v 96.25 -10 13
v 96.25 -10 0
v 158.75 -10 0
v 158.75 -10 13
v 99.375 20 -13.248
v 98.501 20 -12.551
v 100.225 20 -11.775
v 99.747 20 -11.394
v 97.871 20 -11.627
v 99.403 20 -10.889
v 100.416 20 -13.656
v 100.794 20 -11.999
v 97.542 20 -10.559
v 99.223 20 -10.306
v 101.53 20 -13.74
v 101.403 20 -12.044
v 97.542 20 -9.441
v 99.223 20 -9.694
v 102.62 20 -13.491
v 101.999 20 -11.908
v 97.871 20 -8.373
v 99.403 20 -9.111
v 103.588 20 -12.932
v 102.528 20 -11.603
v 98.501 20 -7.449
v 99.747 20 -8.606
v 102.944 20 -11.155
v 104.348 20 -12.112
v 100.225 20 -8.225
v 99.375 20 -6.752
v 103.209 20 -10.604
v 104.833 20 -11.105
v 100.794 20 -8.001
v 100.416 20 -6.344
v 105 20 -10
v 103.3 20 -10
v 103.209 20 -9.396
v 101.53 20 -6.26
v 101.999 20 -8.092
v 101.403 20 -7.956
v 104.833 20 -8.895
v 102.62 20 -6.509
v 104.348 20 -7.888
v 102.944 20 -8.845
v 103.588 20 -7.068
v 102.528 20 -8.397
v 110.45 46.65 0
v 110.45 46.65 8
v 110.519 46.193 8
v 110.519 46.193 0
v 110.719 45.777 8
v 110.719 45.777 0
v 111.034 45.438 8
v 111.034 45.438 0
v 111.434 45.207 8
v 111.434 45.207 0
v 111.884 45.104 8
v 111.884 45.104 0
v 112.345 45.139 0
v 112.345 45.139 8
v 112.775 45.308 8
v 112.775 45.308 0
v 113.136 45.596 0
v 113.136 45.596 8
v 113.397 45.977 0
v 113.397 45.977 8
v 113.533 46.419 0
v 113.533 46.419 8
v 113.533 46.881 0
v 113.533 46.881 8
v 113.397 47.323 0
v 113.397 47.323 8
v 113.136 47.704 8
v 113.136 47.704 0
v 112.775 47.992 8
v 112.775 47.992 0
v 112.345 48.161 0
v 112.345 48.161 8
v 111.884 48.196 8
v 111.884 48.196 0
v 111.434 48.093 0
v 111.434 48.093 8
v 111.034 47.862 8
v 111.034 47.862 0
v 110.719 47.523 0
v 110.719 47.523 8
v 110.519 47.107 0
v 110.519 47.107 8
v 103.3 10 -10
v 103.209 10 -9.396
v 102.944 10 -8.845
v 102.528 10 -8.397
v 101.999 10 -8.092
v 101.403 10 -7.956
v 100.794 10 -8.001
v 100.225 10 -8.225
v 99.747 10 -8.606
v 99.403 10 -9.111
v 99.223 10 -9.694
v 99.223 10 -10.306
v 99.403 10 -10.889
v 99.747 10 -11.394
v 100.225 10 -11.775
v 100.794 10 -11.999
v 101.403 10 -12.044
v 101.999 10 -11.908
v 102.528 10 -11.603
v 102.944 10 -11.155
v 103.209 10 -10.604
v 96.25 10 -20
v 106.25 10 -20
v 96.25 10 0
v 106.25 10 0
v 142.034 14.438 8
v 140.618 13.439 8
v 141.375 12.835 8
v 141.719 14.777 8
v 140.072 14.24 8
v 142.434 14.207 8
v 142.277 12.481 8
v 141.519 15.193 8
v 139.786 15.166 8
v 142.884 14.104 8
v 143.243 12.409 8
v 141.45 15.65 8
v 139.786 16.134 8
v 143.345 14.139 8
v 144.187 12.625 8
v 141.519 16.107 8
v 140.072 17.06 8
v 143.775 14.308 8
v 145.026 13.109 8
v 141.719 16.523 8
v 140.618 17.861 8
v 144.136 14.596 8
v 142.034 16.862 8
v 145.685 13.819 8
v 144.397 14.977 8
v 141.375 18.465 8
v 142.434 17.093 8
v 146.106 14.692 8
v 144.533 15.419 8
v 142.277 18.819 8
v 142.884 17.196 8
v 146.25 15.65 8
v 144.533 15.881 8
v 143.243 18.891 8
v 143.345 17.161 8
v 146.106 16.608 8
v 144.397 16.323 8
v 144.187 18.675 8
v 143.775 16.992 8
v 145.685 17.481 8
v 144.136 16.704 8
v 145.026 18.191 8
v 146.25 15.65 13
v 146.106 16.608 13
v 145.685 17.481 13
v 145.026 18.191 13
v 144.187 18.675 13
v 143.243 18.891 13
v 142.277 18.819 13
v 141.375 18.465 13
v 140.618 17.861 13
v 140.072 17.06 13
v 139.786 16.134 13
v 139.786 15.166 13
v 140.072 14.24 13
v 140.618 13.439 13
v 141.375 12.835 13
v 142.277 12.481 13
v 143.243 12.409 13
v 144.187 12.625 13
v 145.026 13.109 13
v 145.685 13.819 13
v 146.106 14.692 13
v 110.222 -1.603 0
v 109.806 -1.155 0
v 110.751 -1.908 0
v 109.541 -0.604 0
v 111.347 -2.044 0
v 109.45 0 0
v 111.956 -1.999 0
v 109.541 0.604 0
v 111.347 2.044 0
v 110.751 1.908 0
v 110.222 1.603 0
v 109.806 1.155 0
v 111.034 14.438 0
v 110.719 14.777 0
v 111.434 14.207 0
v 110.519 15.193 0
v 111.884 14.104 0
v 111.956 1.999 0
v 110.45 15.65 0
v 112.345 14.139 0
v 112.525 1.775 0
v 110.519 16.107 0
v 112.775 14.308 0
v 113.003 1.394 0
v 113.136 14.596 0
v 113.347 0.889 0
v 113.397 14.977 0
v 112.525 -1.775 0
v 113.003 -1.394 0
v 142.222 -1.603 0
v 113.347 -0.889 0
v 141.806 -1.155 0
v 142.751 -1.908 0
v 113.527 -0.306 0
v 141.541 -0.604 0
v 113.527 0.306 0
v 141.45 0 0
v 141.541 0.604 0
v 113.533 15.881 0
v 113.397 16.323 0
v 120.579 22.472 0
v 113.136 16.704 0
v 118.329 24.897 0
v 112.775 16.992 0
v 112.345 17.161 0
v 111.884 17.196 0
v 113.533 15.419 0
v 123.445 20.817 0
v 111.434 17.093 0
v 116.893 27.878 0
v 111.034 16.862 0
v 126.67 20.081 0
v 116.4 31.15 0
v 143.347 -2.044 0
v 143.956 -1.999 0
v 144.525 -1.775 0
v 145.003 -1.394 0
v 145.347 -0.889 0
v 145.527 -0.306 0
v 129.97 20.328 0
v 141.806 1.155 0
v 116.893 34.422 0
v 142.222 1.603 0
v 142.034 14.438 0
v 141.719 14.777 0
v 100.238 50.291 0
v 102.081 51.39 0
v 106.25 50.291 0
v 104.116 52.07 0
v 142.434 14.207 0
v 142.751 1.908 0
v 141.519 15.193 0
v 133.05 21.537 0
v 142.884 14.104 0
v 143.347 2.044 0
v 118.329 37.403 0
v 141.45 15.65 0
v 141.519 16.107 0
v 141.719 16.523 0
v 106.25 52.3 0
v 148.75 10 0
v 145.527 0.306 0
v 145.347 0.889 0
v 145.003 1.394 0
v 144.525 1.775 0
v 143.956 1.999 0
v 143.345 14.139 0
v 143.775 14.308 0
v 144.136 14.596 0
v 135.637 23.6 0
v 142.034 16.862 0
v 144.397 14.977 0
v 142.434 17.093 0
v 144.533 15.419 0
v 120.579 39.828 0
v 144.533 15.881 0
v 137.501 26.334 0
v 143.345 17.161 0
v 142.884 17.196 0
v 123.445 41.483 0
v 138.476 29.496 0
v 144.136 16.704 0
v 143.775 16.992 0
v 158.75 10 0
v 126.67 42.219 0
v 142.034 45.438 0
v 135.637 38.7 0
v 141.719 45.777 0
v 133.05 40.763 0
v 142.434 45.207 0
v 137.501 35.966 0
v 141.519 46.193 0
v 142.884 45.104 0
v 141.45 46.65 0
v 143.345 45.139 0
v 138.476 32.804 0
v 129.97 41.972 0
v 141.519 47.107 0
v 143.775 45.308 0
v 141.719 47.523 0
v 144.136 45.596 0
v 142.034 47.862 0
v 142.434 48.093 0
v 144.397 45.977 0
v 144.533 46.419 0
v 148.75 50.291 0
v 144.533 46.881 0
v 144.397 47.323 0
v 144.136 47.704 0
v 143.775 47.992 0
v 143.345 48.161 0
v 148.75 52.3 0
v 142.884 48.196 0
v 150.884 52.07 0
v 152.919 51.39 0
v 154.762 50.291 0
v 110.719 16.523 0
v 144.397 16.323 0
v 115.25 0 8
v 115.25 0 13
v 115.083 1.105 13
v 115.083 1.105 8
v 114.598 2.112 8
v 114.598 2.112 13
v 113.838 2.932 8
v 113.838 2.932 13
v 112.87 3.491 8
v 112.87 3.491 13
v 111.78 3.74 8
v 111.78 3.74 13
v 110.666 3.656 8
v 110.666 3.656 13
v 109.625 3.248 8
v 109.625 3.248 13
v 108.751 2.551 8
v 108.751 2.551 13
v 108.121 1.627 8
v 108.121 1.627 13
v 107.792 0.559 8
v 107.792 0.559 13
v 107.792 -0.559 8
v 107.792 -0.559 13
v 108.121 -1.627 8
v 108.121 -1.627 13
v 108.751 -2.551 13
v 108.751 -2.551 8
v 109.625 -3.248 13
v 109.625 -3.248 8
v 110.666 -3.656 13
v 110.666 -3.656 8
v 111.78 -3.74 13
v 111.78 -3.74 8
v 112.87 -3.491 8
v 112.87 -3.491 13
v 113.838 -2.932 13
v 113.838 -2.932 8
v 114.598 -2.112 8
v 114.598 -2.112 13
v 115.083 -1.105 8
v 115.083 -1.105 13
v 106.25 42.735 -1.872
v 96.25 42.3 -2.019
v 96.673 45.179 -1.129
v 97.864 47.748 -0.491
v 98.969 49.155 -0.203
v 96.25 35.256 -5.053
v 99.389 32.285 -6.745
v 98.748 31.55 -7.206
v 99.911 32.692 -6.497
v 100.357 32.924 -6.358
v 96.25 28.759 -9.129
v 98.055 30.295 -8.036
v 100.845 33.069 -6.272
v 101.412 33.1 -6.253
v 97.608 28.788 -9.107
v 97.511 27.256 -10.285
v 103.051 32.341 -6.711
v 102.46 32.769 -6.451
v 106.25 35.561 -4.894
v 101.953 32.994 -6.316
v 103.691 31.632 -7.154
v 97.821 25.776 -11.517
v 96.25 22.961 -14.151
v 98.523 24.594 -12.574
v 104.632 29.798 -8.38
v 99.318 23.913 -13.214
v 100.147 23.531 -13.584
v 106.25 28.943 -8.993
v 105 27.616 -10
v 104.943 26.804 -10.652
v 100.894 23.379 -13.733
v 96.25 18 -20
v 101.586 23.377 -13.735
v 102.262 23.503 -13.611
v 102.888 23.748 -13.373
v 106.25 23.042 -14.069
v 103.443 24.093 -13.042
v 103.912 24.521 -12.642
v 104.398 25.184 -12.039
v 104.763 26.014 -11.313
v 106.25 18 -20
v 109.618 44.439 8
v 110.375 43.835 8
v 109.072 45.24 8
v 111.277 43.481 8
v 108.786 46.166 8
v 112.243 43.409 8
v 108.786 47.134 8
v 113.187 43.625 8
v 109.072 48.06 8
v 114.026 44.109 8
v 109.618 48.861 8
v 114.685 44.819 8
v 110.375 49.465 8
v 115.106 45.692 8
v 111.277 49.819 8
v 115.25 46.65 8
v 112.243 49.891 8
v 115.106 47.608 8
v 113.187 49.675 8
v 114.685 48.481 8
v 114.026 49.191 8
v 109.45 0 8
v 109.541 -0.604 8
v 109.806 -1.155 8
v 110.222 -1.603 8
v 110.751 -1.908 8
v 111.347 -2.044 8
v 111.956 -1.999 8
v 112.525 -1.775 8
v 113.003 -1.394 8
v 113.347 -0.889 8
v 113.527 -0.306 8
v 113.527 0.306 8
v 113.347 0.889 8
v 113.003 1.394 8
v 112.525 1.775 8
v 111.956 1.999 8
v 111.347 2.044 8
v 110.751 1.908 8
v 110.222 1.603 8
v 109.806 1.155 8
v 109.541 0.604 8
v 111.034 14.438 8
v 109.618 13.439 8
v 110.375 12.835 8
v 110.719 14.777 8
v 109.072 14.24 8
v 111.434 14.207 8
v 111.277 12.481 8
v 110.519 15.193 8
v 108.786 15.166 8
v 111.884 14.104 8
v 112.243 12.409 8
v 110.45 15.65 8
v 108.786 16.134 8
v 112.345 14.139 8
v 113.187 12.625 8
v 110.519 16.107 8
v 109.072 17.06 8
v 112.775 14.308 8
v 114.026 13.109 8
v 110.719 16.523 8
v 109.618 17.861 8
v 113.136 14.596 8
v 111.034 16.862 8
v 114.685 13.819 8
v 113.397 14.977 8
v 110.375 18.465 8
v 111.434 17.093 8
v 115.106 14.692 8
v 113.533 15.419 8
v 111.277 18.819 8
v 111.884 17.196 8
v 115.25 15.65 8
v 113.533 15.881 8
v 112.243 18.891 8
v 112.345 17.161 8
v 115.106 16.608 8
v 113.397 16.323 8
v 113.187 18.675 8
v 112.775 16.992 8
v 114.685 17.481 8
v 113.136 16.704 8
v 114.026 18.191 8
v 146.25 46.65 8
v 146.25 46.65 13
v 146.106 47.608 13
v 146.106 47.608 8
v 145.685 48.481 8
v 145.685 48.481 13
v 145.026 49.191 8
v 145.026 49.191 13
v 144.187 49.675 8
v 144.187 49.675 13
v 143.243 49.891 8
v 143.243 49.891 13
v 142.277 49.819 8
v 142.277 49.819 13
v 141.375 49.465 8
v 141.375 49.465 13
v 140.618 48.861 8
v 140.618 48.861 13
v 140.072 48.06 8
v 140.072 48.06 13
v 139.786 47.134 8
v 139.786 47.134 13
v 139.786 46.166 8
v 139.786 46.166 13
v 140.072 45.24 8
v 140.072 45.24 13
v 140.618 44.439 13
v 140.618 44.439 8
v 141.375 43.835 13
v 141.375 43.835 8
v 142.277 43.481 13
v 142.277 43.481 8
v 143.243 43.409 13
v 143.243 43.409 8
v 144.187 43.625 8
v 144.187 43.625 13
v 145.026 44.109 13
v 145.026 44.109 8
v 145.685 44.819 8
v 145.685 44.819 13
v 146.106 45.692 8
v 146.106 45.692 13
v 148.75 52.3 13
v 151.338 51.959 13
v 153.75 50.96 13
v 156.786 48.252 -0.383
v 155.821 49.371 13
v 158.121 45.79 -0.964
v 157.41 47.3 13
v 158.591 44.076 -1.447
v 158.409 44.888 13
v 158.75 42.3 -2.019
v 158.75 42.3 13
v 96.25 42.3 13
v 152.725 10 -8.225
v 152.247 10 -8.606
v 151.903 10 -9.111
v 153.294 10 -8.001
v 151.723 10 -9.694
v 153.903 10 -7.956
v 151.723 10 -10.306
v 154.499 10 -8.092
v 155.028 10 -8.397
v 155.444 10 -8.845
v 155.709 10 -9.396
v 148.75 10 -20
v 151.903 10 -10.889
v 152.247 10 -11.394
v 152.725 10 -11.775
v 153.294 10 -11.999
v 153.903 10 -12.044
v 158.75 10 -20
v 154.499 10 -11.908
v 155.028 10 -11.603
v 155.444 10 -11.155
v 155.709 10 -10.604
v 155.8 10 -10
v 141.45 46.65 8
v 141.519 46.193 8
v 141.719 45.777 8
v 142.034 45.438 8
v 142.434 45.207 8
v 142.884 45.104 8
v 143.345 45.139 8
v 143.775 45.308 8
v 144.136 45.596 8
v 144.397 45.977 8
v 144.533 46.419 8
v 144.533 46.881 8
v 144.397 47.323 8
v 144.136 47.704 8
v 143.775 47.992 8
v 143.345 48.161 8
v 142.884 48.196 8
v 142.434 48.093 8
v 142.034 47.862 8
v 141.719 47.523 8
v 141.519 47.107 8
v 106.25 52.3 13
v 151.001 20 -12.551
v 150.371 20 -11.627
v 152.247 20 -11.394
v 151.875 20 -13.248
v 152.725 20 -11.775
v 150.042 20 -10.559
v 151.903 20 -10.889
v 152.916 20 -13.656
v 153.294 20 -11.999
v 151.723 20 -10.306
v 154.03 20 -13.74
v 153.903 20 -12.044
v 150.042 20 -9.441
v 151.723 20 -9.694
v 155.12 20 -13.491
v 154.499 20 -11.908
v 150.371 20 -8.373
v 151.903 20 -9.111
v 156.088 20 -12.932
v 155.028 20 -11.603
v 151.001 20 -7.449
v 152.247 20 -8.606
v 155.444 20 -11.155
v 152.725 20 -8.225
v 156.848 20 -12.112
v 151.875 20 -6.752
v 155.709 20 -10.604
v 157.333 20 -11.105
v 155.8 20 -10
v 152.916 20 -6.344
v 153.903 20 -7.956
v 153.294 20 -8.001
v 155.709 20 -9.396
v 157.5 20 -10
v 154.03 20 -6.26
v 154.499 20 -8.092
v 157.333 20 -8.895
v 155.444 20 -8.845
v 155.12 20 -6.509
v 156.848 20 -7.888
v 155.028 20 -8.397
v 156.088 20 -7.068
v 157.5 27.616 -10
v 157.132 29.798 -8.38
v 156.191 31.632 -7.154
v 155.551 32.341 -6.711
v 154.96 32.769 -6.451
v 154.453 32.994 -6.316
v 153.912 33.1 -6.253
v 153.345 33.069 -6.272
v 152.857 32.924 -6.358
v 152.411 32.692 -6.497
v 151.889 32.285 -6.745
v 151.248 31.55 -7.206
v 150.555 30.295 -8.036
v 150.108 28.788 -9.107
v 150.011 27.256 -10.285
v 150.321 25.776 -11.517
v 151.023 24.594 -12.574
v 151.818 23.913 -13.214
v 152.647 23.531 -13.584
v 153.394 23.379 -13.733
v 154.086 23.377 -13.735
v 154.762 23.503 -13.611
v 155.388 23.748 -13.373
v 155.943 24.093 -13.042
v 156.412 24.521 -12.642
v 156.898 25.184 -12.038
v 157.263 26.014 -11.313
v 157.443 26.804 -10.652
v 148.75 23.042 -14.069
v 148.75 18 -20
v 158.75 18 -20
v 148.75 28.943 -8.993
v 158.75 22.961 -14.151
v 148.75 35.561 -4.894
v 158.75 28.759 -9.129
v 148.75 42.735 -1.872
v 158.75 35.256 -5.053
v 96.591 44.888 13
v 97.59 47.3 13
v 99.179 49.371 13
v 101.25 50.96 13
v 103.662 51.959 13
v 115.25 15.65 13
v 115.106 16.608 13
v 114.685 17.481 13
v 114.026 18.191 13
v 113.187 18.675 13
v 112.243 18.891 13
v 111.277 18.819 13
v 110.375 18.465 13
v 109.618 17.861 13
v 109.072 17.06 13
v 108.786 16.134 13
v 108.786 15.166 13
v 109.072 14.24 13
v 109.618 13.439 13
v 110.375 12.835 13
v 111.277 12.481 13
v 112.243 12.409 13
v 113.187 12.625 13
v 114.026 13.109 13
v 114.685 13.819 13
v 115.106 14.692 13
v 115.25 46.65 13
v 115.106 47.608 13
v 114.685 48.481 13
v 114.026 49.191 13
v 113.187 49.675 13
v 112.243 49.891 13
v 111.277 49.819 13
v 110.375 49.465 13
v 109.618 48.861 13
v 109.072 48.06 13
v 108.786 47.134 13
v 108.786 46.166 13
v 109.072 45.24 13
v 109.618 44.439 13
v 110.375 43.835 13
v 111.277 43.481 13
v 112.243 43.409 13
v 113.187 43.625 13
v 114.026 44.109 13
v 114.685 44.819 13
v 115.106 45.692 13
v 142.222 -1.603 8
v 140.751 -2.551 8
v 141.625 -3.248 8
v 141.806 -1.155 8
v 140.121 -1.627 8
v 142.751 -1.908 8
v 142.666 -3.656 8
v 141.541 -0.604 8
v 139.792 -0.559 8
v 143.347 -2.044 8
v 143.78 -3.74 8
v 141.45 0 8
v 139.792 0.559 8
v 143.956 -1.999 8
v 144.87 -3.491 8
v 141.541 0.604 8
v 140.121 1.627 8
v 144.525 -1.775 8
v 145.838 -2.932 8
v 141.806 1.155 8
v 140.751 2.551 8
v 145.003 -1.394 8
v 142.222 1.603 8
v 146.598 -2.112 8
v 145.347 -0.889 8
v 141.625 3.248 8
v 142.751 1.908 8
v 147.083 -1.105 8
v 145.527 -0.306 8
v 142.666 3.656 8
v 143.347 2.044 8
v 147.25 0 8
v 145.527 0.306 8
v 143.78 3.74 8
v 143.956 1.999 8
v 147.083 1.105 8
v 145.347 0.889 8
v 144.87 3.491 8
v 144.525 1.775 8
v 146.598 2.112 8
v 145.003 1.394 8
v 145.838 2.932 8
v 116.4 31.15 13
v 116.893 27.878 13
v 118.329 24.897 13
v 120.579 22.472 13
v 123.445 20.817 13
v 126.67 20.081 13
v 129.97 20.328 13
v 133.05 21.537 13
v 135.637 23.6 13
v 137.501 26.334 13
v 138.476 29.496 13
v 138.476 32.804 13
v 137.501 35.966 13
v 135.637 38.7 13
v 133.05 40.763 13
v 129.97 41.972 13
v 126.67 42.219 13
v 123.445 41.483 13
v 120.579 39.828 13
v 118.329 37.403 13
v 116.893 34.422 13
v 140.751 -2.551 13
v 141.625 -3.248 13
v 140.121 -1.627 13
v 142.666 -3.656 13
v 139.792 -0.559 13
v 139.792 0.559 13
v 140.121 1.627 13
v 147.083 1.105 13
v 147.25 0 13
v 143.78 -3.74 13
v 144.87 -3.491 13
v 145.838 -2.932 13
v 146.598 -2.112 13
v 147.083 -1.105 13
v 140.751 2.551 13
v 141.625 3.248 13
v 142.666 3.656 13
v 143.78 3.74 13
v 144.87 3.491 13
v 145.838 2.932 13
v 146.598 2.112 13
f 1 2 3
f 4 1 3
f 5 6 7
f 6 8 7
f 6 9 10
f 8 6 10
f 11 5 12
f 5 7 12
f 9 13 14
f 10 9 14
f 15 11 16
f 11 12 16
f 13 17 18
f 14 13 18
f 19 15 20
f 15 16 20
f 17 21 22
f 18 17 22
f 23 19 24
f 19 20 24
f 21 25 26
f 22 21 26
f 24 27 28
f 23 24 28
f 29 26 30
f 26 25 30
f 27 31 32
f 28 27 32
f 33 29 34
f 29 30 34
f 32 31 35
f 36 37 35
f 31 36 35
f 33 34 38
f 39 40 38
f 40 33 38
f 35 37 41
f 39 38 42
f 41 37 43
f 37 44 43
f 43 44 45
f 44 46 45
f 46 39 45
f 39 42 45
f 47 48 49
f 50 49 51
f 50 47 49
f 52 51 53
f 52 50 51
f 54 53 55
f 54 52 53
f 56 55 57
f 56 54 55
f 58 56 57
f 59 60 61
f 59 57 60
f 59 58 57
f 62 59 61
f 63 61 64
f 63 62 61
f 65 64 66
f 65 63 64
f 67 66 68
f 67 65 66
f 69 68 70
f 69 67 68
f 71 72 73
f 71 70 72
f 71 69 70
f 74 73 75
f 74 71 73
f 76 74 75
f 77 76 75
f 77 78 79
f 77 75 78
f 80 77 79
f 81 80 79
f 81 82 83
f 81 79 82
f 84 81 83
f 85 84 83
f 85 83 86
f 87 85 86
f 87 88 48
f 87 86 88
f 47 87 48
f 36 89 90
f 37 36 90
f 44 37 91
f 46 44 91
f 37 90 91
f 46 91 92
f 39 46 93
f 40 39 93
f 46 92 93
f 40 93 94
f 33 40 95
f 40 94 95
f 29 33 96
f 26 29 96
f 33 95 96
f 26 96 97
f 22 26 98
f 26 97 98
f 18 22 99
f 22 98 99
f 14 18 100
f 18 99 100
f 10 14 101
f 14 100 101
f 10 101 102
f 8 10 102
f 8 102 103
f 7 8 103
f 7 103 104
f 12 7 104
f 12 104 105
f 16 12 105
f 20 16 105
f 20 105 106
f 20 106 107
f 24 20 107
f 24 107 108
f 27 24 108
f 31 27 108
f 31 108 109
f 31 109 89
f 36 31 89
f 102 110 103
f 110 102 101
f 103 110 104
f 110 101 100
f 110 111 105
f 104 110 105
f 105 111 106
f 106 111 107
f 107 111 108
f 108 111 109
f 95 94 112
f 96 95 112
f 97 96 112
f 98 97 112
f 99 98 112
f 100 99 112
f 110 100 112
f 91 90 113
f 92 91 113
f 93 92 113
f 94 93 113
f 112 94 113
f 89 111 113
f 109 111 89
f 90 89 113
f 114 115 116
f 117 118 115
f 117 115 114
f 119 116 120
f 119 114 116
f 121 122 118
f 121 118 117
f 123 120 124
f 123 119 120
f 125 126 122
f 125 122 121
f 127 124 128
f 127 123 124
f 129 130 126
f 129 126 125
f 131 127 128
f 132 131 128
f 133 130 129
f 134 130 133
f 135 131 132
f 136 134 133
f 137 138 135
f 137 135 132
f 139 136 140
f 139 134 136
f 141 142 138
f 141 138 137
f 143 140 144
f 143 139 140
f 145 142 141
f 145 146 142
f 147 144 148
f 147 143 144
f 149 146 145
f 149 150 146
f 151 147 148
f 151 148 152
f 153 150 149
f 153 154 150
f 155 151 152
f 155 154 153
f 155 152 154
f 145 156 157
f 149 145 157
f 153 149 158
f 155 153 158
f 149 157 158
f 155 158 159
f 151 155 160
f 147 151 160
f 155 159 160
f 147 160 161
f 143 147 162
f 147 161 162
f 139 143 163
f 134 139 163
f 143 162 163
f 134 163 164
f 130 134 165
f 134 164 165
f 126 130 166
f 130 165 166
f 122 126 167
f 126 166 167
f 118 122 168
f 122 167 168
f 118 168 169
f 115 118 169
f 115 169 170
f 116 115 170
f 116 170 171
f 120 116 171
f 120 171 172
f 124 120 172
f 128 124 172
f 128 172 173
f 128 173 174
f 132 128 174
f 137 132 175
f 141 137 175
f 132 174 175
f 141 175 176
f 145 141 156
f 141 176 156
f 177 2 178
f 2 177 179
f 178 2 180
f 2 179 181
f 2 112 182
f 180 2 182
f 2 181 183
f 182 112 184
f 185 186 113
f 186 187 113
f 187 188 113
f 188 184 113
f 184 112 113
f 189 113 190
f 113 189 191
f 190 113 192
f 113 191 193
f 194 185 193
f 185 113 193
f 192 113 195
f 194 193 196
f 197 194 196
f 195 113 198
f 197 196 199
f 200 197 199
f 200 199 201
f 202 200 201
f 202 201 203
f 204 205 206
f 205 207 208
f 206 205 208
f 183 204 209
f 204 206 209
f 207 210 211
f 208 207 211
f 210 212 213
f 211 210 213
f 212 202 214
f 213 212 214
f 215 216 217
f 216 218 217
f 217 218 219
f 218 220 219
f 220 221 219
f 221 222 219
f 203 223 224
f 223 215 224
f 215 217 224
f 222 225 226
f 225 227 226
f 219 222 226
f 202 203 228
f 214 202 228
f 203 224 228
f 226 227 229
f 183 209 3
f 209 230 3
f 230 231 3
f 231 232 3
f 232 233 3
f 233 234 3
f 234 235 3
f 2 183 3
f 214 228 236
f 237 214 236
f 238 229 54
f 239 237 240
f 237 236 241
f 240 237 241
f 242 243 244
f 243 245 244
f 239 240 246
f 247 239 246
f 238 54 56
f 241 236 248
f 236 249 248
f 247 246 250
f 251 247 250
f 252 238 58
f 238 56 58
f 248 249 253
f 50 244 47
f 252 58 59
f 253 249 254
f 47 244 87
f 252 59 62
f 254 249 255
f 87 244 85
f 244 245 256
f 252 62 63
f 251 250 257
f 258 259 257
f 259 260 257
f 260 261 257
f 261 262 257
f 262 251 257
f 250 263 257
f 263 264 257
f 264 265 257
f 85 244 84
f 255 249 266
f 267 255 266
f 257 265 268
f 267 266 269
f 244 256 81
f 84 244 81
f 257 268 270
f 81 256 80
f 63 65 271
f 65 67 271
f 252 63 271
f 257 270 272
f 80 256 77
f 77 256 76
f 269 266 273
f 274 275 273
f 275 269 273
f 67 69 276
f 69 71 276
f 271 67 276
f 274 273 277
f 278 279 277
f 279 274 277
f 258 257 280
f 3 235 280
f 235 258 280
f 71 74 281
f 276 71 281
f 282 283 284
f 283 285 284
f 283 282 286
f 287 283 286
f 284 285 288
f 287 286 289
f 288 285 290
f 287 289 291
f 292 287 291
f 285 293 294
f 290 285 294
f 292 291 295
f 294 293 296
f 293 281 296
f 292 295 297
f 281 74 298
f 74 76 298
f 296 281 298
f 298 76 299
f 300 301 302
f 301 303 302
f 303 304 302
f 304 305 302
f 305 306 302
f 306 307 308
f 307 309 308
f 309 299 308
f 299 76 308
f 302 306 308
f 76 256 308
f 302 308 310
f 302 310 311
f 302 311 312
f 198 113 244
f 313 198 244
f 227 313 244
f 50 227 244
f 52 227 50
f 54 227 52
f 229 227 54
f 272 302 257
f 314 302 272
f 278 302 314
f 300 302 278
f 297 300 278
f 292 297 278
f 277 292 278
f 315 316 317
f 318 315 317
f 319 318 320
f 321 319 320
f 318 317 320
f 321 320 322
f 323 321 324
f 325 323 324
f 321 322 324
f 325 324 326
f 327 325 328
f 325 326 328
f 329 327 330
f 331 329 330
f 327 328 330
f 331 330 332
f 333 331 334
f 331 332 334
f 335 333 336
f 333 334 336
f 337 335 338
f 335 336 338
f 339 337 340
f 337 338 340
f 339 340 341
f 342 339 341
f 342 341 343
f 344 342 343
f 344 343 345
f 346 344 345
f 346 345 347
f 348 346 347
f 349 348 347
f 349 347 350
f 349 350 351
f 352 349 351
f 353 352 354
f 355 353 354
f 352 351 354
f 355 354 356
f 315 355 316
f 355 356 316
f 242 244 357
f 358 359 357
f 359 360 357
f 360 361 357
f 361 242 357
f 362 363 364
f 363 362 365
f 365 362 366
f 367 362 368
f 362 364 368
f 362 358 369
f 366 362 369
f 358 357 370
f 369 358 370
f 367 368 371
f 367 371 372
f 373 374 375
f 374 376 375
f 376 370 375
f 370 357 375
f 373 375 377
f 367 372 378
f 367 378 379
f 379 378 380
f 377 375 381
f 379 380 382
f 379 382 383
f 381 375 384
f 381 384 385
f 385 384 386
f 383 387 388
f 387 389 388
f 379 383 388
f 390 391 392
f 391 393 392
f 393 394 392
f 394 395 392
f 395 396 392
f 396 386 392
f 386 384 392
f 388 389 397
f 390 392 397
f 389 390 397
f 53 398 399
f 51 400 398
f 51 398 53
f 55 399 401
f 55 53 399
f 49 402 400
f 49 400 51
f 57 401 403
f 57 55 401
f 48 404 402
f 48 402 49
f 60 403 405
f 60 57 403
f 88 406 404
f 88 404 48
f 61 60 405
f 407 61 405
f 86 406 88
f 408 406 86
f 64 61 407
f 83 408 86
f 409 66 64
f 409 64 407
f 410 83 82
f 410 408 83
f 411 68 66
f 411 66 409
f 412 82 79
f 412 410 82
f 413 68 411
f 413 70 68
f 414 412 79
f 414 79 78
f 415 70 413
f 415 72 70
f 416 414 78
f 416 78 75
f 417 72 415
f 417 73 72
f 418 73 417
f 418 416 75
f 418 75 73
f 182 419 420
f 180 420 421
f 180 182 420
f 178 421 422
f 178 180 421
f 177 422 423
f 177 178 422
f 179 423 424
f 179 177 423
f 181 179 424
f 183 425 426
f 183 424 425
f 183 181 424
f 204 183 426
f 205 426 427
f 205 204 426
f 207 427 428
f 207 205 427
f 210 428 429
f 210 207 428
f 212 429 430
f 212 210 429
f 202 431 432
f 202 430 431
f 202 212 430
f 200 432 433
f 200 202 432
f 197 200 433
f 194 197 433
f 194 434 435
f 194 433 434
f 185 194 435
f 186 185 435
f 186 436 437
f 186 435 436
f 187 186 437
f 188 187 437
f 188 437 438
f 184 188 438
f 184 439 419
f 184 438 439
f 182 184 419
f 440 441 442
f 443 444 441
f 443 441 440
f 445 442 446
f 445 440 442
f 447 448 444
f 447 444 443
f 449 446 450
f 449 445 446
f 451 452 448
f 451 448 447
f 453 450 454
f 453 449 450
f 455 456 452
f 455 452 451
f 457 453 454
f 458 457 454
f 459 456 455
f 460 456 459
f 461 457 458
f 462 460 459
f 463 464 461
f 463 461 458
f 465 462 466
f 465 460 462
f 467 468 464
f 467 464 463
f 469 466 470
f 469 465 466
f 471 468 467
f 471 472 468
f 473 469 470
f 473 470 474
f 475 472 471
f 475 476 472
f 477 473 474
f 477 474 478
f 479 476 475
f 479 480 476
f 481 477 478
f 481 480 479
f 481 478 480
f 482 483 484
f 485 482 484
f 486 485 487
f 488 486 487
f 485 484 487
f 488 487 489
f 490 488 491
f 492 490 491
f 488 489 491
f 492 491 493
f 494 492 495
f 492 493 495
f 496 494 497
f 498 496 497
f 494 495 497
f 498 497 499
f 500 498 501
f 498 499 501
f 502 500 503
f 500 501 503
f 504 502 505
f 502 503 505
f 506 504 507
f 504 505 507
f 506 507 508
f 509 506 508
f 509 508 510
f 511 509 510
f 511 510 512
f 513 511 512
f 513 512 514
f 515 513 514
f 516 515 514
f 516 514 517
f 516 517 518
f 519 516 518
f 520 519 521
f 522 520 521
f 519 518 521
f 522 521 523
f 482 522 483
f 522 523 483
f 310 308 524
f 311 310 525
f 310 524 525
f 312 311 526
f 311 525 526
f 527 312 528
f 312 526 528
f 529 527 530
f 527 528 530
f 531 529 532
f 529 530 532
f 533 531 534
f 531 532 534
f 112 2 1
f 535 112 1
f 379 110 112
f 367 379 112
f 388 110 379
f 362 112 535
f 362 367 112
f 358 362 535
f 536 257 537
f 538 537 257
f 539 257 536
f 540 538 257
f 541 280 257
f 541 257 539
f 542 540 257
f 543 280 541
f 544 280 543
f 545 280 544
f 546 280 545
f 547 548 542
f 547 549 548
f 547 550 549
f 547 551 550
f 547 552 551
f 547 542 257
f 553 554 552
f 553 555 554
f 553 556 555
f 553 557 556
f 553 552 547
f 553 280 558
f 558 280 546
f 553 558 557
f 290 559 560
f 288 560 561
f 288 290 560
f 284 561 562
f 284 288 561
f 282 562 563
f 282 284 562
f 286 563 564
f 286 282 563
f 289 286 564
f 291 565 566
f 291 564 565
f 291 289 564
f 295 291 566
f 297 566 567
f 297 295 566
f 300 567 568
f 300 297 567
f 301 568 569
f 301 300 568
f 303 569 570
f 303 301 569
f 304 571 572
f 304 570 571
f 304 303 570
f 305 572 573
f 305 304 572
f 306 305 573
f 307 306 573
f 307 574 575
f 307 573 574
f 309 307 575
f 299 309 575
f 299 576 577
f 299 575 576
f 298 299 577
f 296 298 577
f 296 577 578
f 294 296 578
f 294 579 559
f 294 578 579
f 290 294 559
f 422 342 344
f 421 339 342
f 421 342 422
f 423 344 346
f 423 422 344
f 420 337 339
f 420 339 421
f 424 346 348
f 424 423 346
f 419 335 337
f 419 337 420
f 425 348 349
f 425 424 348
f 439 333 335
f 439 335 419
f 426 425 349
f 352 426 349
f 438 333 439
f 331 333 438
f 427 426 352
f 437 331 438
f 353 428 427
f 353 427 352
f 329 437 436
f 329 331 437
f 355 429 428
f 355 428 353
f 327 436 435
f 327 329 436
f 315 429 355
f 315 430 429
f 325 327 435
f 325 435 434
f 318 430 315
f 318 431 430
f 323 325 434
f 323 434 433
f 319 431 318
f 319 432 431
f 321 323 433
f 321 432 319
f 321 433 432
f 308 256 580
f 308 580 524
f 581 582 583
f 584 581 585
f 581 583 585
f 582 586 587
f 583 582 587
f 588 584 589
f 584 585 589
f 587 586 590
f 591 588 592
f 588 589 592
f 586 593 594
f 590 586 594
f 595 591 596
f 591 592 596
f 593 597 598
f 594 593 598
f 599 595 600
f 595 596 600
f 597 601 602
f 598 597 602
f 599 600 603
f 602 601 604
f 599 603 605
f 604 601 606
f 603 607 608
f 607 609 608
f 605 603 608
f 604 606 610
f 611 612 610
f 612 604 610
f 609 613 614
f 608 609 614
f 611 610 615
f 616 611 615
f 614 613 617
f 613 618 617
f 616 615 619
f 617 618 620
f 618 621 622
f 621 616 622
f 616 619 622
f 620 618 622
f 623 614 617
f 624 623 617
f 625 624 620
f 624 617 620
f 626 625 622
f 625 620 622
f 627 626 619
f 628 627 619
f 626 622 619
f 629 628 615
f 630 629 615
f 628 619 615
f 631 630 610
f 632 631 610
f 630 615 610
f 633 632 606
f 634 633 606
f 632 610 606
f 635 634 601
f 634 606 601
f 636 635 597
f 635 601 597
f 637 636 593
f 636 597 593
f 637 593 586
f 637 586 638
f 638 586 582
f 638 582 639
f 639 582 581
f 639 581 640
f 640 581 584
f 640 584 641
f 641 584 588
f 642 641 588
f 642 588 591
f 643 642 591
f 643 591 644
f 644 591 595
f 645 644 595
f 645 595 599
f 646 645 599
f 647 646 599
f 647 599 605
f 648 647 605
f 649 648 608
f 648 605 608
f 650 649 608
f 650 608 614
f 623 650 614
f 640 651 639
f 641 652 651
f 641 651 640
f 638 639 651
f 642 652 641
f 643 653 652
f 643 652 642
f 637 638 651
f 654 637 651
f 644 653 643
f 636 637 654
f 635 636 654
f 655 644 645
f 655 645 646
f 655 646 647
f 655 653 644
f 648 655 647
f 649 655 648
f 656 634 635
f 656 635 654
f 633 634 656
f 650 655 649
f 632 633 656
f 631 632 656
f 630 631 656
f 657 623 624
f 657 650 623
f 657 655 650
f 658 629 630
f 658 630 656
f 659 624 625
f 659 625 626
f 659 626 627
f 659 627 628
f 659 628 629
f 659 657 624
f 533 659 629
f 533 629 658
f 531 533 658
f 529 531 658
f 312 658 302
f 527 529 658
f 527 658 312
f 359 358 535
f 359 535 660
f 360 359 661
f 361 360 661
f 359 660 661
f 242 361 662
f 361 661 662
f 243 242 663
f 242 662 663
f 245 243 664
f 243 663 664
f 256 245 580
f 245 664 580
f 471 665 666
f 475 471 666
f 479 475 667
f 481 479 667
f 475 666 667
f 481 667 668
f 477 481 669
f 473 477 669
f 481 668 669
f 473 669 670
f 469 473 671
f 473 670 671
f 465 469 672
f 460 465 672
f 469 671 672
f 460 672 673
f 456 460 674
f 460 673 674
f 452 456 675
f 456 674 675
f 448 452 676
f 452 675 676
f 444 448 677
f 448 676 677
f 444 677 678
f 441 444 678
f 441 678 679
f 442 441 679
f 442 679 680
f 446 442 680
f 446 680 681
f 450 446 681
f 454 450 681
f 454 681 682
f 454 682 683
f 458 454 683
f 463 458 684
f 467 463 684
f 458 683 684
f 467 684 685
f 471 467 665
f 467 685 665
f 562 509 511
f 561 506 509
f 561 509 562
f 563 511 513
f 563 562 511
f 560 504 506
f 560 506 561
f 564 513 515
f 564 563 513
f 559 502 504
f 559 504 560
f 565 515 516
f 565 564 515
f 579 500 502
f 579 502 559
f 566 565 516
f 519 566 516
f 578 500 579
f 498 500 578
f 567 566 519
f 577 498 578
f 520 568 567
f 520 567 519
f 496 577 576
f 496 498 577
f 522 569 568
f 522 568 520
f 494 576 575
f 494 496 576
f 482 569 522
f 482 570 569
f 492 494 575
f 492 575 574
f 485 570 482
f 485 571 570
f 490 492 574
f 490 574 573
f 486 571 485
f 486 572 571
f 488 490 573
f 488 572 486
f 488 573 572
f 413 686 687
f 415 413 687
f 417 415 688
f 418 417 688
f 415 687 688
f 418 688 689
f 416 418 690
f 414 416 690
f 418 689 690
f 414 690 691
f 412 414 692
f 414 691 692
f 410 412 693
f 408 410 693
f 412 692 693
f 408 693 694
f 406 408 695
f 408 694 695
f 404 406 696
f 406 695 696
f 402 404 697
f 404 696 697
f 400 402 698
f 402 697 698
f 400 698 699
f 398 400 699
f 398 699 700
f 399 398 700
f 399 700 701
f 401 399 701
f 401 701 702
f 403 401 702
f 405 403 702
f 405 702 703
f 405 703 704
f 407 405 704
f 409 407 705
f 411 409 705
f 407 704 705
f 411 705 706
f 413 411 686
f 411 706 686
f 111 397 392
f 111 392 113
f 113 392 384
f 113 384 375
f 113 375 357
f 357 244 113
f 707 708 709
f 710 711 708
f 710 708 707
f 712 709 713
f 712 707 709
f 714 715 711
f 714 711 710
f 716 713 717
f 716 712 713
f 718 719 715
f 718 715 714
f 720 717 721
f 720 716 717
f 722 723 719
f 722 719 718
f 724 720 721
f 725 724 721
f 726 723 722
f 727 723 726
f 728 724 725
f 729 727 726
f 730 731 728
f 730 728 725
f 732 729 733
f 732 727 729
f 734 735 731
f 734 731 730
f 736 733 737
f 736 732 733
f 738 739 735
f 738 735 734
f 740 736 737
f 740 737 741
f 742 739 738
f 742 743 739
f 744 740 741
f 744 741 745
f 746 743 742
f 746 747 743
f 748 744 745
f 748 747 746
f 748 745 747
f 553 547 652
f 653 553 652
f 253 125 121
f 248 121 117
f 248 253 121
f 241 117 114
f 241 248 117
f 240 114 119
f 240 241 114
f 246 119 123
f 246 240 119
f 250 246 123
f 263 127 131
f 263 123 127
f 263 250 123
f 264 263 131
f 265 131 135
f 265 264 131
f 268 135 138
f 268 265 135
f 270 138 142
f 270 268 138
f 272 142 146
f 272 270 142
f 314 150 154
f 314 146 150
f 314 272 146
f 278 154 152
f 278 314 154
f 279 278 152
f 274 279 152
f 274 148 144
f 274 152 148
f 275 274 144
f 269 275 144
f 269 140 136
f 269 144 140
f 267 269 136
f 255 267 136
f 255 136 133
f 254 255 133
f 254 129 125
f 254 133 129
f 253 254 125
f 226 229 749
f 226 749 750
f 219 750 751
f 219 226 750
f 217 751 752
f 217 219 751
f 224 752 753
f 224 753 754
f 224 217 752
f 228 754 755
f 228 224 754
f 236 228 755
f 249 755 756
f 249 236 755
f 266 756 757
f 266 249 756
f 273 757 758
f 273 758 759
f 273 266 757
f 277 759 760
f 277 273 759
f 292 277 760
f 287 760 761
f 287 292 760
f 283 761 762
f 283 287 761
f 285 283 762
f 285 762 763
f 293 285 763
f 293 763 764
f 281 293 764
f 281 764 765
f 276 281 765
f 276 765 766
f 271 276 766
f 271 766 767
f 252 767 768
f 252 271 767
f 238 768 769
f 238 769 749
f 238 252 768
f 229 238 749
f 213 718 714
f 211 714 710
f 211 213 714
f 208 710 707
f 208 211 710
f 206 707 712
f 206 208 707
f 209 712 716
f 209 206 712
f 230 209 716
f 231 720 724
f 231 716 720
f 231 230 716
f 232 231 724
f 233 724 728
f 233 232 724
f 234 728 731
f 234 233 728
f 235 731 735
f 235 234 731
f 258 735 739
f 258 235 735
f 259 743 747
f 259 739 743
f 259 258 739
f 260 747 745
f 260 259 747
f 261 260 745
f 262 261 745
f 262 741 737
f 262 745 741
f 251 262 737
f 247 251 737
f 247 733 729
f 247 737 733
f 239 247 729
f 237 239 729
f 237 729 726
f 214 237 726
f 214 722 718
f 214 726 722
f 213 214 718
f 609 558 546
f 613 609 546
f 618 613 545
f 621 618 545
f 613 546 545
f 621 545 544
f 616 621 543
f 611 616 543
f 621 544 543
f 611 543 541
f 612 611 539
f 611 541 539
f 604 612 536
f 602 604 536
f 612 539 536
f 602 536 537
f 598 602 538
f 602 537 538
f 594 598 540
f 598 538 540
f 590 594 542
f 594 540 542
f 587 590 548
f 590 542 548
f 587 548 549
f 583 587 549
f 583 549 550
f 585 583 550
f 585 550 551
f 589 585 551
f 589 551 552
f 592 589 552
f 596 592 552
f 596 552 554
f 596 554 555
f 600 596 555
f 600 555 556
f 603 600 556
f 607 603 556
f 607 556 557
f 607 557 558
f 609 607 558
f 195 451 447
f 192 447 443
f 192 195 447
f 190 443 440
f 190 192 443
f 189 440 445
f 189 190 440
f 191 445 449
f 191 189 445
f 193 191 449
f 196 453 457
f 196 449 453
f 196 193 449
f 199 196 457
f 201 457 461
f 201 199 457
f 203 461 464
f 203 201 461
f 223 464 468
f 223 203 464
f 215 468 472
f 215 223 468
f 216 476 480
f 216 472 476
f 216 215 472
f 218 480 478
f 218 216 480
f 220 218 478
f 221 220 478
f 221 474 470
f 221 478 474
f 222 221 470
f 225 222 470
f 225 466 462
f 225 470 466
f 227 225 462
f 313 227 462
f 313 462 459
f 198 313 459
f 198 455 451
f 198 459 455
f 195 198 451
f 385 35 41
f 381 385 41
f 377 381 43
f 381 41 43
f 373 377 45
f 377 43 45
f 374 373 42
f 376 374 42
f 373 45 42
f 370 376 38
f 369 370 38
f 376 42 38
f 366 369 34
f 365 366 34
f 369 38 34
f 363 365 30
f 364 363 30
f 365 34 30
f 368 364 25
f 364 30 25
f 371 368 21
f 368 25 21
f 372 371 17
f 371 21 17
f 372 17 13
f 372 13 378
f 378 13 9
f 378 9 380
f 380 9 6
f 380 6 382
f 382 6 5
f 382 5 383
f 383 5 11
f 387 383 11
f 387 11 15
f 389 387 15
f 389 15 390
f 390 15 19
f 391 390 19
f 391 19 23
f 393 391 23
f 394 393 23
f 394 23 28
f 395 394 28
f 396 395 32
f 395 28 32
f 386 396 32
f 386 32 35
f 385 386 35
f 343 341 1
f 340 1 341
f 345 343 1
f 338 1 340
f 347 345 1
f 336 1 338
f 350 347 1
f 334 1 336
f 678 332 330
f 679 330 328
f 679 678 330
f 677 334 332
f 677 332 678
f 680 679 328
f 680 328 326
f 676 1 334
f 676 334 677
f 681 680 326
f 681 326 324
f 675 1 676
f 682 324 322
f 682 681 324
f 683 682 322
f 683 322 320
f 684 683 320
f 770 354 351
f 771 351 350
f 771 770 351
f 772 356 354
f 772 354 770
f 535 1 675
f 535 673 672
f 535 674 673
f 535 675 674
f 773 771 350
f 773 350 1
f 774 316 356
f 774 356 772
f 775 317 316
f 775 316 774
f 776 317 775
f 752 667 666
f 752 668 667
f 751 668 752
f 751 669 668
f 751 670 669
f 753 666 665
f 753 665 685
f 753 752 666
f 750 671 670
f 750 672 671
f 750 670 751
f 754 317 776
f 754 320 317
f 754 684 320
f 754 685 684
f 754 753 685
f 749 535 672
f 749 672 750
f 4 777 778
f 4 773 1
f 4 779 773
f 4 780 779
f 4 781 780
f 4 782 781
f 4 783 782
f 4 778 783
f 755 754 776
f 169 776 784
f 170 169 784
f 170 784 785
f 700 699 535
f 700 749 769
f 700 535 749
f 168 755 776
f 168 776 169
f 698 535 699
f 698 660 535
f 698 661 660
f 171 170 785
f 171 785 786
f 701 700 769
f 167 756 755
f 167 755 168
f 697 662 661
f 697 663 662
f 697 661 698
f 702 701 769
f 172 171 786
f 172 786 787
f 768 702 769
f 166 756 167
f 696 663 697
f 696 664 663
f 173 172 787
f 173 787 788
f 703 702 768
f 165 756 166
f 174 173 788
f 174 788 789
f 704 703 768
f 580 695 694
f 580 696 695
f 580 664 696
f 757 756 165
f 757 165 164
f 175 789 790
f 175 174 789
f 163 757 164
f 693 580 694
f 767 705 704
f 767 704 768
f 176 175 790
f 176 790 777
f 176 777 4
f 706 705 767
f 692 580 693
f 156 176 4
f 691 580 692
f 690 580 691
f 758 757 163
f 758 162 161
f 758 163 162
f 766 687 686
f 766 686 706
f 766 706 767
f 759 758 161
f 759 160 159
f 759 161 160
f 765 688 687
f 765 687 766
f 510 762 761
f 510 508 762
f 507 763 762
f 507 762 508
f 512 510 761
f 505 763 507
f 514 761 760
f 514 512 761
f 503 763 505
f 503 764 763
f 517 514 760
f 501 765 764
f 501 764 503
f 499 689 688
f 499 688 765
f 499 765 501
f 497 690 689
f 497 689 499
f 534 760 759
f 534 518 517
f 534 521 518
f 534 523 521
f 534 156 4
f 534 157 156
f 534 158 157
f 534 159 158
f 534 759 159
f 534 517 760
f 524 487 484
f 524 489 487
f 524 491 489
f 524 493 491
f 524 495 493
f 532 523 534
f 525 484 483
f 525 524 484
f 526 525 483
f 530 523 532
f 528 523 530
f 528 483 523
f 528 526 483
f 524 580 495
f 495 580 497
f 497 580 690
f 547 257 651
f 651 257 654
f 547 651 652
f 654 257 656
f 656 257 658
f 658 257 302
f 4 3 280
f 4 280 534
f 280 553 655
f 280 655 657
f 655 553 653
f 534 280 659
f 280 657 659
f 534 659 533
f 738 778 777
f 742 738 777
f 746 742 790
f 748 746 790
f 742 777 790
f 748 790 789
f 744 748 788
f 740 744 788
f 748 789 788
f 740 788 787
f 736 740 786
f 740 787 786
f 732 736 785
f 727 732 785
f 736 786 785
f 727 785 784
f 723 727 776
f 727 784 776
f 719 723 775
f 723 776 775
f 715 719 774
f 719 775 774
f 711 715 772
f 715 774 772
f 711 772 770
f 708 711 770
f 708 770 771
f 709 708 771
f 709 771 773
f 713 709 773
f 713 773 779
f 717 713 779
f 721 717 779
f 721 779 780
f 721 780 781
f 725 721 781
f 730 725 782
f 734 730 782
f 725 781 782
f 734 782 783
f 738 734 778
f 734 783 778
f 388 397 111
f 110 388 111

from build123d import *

# Parameters (mm, degrees)
CROQUIS1_W                 = 62.5
CROQUIS1_H                 = 62.3
CROQUIS1_R                 = 11.1
CROQUIS1_R_2               = 1.55
CROQUIS1_R_3               = 2.05
SALIENTE_EXTRUIR1_DEPTH    = 13
CROQUIS2_R                 = 3.25
CROQUIS2_R_2               = 3.75
CORTAR_EXTRUIR1_DEPTH      = 5
SALIENTE_EXTRUIR2_DEPTH    = 10
SALIENTE_EXTRUIR3_START    = -10
SALIENTE_EXTRUIR3_DEPTH    = 10
CORTAR_EXTRUIR2_REACH      = 167.502
CORTAR_EXTRUIR2_END_RADIUS = 50
CROQUIS6_R                 = 2.05
CORTAR_EXTRUIR3_REACH      = 177.502
CORTAR_EXTRUIR3_END_RADIUS = 50
CORTAR_EXTRUIR3_START      = -10
CROQUIS7_R                 = 3.75
REDONDEO1_R                = 10


with BuildPart() as part:
    # Croquis1 → Saliente-Extruir1 (new body)
    with BuildSketch(Plane.XY):
        with Locations((127.5, 21.15)):
            Rectangle(CROQUIS1_W, CROQUIS1_H)
        with Locations(Location((127.5, 31.15, 0), (0, 0, 180))):
            Circle(CROQUIS1_R, mode=Mode.SUBTRACT)
        with Locations(Location((112, 46.65, 0), (0, 0, 180))):
            Circle(CROQUIS1_R_2, mode=Mode.SUBTRACT)
        with Locations(Location((143, 46.65, 0), (0, 0, 180))):
            Circle(CROQUIS1_R_2, mode=Mode.SUBTRACT)
        with Locations(Location((143, 15.65, 0), (0, 0, 180))):
            Circle(CROQUIS1_R_2, mode=Mode.SUBTRACT)
        with Locations(Location((112, 15.65, 0), (0, 0, 180))):
            Circle(CROQUIS1_R_2, mode=Mode.SUBTRACT)
        with Locations(Location((111.5, 0, 0), (0, 0, 180))):
            Circle(CROQUIS1_R_3, mode=Mode.SUBTRACT)
        with Locations(Location((143.5, 0, 0), (0, 0, 180))):
            Circle(CROQUIS1_R_3, mode=Mode.SUBTRACT)
    extrude(amount=SALIENTE_EXTRUIR1_DEPTH)

    # Croquis2 → Cortar-Extruir1 (cut)
    with BuildSketch(Plane.XY.offset(13)):
        with Locations((112, 46.65)):
            Circle(CROQUIS2_R)
        with Locations((143, 46.65)):
            Circle(CROQUIS2_R)
        with Locations((143, 15.65)):
            Circle(CROQUIS2_R)
        with Locations((112, 15.65)):
            Circle(CROQUIS2_R)
        with Locations((111.5, 0)):
            Circle(CROQUIS2_R_2)
        with Locations((143.5, 0)):
            Circle(CROQUIS2_R_2)
    extrude(amount=-CORTAR_EXTRUIR1_DEPTH, mode=Mode.SUBTRACT)

    # Croquis4 → Saliente-Extruir2 (add)
    with BuildSketch(Plane(origin=(158.75, 0, 0), x_dir=(0, 0, -1), z_dir=(1, 0, 0))):
        with BuildLine():
            Line((0, 10), (20, 10))
            Line((20, 10), (20, 18))
            ThreePointArc((20, 18), (6.81438238, 32.17234388), (0, 50.290843704))
            Line((0, 50.290843704), (0, 10))
        make_face()
    extrude(amount=-SALIENTE_EXTRUIR2_DEPTH)

    # Croquis5 → Saliente-Extruir3 (add)
    with BuildSketch(Plane.ZY.offset(-96.25).offset(SALIENTE_EXTRUIR3_START)):
        with BuildLine():
            Line((0, 10), (0, 50.290843704))
            ThreePointArc((0, 50.290843704), (-6.81438238, 32.17234388), (-20, 18))
            Line((-20, 18), (-20, 10))
            Line((-20, 10), (0, 10))
        make_face()
    extrude(amount=SALIENTE_EXTRUIR3_DEPTH)

    # Cortar-Extruir2: up to this cylinder (the profile starts outside it)
    cortar_extruir2_end = Plane(origin=(127.5, 58.5, -49.321493823), z_dir=(1, 0, 0)) * Cylinder(CORTAR_EXTRUIR2_END_RADIUS, 488.504, mode=Mode.PRIVATE)
    # Croquis6 → Cortar-Extruir2 (cut, up to the surface)
    with BuildSketch(Plane.XZ.offset(-10), mode=Mode.PRIVATE) as cortar_extruir2_sk1:
        with Locations((101.25, -10)):
            Circle(CROQUIS6_R)
    cortar_extruir2_tool1 = extrude(cortar_extruir2_sk1.sketch, amount=-CORTAR_EXTRUIR2_REACH, mode=Mode.PRIVATE) - cortar_extruir2_end
    add(cortar_extruir2_tool1.solids().sort_by_distance((101.25, 10, -10))[0], mode=Mode.SUBTRACT)
    # Croquis6 → Cortar-Extruir2 (cut, up to the surface)
    with BuildSketch(Plane.XZ.offset(-10), mode=Mode.PRIVATE) as cortar_extruir2_sk2:
        with Locations((153.75, -10)):
            Circle(CROQUIS6_R)
    cortar_extruir2_tool2 = extrude(cortar_extruir2_sk2.sketch, amount=-CORTAR_EXTRUIR2_REACH, mode=Mode.PRIVATE) - cortar_extruir2_end
    add(cortar_extruir2_tool2.solids().sort_by_distance((153.75, 10, -10))[0], mode=Mode.SUBTRACT)

    # Cortar-Extruir3: up to this cylinder (the profile starts outside it)
    cortar_extruir3_end = Plane(origin=(127.5, 58.5, -49.321493823), z_dir=(1, 0, 0)) * Cylinder(CORTAR_EXTRUIR3_END_RADIUS, 508.504, mode=Mode.PRIVATE)
    # Croquis7 → Cortar-Extruir3 (cut, up to the surface)
    with BuildSketch(Plane.XZ.offset(-10).offset(CORTAR_EXTRUIR3_START), mode=Mode.PRIVATE) as cortar_extruir3_sk1:
        with Locations((101.25, -10)):
            Circle(CROQUIS7_R)
    cortar_extruir3_tool1 = extrude(cortar_extruir3_sk1.sketch, amount=-CORTAR_EXTRUIR3_REACH, mode=Mode.PRIVATE) - cortar_extruir3_end
    add(cortar_extruir3_tool1.solids().sort_by_distance((101.25, 20, -10))[0], mode=Mode.SUBTRACT)
    # Croquis7 → Cortar-Extruir3 (cut, up to the surface)
    with BuildSketch(Plane.XZ.offset(-10).offset(CORTAR_EXTRUIR3_START), mode=Mode.PRIVATE) as cortar_extruir3_sk2:
        with Locations((153.75, -10)):
            Circle(CROQUIS7_R)
    cortar_extruir3_tool2 = extrude(cortar_extruir3_sk2.sketch, amount=-CORTAR_EXTRUIR3_REACH, mode=Mode.PRIVATE) - cortar_extruir3_end
    add(cortar_extruir3_tool2.solids().sort_by_distance((153.75, 20, -10))[0], mode=Mode.SUBTRACT)

    # Redondeo1
    redondeo1_edges = [part.edges().sort_by_distance(p)[0] for p in [
        (96.25, 52.3, 6.5),
        (158.75, 52.3, 6.5),
    ]]
    fillet(redondeo1_edges, radius=REDONDEO1_R)


solid = part.part
